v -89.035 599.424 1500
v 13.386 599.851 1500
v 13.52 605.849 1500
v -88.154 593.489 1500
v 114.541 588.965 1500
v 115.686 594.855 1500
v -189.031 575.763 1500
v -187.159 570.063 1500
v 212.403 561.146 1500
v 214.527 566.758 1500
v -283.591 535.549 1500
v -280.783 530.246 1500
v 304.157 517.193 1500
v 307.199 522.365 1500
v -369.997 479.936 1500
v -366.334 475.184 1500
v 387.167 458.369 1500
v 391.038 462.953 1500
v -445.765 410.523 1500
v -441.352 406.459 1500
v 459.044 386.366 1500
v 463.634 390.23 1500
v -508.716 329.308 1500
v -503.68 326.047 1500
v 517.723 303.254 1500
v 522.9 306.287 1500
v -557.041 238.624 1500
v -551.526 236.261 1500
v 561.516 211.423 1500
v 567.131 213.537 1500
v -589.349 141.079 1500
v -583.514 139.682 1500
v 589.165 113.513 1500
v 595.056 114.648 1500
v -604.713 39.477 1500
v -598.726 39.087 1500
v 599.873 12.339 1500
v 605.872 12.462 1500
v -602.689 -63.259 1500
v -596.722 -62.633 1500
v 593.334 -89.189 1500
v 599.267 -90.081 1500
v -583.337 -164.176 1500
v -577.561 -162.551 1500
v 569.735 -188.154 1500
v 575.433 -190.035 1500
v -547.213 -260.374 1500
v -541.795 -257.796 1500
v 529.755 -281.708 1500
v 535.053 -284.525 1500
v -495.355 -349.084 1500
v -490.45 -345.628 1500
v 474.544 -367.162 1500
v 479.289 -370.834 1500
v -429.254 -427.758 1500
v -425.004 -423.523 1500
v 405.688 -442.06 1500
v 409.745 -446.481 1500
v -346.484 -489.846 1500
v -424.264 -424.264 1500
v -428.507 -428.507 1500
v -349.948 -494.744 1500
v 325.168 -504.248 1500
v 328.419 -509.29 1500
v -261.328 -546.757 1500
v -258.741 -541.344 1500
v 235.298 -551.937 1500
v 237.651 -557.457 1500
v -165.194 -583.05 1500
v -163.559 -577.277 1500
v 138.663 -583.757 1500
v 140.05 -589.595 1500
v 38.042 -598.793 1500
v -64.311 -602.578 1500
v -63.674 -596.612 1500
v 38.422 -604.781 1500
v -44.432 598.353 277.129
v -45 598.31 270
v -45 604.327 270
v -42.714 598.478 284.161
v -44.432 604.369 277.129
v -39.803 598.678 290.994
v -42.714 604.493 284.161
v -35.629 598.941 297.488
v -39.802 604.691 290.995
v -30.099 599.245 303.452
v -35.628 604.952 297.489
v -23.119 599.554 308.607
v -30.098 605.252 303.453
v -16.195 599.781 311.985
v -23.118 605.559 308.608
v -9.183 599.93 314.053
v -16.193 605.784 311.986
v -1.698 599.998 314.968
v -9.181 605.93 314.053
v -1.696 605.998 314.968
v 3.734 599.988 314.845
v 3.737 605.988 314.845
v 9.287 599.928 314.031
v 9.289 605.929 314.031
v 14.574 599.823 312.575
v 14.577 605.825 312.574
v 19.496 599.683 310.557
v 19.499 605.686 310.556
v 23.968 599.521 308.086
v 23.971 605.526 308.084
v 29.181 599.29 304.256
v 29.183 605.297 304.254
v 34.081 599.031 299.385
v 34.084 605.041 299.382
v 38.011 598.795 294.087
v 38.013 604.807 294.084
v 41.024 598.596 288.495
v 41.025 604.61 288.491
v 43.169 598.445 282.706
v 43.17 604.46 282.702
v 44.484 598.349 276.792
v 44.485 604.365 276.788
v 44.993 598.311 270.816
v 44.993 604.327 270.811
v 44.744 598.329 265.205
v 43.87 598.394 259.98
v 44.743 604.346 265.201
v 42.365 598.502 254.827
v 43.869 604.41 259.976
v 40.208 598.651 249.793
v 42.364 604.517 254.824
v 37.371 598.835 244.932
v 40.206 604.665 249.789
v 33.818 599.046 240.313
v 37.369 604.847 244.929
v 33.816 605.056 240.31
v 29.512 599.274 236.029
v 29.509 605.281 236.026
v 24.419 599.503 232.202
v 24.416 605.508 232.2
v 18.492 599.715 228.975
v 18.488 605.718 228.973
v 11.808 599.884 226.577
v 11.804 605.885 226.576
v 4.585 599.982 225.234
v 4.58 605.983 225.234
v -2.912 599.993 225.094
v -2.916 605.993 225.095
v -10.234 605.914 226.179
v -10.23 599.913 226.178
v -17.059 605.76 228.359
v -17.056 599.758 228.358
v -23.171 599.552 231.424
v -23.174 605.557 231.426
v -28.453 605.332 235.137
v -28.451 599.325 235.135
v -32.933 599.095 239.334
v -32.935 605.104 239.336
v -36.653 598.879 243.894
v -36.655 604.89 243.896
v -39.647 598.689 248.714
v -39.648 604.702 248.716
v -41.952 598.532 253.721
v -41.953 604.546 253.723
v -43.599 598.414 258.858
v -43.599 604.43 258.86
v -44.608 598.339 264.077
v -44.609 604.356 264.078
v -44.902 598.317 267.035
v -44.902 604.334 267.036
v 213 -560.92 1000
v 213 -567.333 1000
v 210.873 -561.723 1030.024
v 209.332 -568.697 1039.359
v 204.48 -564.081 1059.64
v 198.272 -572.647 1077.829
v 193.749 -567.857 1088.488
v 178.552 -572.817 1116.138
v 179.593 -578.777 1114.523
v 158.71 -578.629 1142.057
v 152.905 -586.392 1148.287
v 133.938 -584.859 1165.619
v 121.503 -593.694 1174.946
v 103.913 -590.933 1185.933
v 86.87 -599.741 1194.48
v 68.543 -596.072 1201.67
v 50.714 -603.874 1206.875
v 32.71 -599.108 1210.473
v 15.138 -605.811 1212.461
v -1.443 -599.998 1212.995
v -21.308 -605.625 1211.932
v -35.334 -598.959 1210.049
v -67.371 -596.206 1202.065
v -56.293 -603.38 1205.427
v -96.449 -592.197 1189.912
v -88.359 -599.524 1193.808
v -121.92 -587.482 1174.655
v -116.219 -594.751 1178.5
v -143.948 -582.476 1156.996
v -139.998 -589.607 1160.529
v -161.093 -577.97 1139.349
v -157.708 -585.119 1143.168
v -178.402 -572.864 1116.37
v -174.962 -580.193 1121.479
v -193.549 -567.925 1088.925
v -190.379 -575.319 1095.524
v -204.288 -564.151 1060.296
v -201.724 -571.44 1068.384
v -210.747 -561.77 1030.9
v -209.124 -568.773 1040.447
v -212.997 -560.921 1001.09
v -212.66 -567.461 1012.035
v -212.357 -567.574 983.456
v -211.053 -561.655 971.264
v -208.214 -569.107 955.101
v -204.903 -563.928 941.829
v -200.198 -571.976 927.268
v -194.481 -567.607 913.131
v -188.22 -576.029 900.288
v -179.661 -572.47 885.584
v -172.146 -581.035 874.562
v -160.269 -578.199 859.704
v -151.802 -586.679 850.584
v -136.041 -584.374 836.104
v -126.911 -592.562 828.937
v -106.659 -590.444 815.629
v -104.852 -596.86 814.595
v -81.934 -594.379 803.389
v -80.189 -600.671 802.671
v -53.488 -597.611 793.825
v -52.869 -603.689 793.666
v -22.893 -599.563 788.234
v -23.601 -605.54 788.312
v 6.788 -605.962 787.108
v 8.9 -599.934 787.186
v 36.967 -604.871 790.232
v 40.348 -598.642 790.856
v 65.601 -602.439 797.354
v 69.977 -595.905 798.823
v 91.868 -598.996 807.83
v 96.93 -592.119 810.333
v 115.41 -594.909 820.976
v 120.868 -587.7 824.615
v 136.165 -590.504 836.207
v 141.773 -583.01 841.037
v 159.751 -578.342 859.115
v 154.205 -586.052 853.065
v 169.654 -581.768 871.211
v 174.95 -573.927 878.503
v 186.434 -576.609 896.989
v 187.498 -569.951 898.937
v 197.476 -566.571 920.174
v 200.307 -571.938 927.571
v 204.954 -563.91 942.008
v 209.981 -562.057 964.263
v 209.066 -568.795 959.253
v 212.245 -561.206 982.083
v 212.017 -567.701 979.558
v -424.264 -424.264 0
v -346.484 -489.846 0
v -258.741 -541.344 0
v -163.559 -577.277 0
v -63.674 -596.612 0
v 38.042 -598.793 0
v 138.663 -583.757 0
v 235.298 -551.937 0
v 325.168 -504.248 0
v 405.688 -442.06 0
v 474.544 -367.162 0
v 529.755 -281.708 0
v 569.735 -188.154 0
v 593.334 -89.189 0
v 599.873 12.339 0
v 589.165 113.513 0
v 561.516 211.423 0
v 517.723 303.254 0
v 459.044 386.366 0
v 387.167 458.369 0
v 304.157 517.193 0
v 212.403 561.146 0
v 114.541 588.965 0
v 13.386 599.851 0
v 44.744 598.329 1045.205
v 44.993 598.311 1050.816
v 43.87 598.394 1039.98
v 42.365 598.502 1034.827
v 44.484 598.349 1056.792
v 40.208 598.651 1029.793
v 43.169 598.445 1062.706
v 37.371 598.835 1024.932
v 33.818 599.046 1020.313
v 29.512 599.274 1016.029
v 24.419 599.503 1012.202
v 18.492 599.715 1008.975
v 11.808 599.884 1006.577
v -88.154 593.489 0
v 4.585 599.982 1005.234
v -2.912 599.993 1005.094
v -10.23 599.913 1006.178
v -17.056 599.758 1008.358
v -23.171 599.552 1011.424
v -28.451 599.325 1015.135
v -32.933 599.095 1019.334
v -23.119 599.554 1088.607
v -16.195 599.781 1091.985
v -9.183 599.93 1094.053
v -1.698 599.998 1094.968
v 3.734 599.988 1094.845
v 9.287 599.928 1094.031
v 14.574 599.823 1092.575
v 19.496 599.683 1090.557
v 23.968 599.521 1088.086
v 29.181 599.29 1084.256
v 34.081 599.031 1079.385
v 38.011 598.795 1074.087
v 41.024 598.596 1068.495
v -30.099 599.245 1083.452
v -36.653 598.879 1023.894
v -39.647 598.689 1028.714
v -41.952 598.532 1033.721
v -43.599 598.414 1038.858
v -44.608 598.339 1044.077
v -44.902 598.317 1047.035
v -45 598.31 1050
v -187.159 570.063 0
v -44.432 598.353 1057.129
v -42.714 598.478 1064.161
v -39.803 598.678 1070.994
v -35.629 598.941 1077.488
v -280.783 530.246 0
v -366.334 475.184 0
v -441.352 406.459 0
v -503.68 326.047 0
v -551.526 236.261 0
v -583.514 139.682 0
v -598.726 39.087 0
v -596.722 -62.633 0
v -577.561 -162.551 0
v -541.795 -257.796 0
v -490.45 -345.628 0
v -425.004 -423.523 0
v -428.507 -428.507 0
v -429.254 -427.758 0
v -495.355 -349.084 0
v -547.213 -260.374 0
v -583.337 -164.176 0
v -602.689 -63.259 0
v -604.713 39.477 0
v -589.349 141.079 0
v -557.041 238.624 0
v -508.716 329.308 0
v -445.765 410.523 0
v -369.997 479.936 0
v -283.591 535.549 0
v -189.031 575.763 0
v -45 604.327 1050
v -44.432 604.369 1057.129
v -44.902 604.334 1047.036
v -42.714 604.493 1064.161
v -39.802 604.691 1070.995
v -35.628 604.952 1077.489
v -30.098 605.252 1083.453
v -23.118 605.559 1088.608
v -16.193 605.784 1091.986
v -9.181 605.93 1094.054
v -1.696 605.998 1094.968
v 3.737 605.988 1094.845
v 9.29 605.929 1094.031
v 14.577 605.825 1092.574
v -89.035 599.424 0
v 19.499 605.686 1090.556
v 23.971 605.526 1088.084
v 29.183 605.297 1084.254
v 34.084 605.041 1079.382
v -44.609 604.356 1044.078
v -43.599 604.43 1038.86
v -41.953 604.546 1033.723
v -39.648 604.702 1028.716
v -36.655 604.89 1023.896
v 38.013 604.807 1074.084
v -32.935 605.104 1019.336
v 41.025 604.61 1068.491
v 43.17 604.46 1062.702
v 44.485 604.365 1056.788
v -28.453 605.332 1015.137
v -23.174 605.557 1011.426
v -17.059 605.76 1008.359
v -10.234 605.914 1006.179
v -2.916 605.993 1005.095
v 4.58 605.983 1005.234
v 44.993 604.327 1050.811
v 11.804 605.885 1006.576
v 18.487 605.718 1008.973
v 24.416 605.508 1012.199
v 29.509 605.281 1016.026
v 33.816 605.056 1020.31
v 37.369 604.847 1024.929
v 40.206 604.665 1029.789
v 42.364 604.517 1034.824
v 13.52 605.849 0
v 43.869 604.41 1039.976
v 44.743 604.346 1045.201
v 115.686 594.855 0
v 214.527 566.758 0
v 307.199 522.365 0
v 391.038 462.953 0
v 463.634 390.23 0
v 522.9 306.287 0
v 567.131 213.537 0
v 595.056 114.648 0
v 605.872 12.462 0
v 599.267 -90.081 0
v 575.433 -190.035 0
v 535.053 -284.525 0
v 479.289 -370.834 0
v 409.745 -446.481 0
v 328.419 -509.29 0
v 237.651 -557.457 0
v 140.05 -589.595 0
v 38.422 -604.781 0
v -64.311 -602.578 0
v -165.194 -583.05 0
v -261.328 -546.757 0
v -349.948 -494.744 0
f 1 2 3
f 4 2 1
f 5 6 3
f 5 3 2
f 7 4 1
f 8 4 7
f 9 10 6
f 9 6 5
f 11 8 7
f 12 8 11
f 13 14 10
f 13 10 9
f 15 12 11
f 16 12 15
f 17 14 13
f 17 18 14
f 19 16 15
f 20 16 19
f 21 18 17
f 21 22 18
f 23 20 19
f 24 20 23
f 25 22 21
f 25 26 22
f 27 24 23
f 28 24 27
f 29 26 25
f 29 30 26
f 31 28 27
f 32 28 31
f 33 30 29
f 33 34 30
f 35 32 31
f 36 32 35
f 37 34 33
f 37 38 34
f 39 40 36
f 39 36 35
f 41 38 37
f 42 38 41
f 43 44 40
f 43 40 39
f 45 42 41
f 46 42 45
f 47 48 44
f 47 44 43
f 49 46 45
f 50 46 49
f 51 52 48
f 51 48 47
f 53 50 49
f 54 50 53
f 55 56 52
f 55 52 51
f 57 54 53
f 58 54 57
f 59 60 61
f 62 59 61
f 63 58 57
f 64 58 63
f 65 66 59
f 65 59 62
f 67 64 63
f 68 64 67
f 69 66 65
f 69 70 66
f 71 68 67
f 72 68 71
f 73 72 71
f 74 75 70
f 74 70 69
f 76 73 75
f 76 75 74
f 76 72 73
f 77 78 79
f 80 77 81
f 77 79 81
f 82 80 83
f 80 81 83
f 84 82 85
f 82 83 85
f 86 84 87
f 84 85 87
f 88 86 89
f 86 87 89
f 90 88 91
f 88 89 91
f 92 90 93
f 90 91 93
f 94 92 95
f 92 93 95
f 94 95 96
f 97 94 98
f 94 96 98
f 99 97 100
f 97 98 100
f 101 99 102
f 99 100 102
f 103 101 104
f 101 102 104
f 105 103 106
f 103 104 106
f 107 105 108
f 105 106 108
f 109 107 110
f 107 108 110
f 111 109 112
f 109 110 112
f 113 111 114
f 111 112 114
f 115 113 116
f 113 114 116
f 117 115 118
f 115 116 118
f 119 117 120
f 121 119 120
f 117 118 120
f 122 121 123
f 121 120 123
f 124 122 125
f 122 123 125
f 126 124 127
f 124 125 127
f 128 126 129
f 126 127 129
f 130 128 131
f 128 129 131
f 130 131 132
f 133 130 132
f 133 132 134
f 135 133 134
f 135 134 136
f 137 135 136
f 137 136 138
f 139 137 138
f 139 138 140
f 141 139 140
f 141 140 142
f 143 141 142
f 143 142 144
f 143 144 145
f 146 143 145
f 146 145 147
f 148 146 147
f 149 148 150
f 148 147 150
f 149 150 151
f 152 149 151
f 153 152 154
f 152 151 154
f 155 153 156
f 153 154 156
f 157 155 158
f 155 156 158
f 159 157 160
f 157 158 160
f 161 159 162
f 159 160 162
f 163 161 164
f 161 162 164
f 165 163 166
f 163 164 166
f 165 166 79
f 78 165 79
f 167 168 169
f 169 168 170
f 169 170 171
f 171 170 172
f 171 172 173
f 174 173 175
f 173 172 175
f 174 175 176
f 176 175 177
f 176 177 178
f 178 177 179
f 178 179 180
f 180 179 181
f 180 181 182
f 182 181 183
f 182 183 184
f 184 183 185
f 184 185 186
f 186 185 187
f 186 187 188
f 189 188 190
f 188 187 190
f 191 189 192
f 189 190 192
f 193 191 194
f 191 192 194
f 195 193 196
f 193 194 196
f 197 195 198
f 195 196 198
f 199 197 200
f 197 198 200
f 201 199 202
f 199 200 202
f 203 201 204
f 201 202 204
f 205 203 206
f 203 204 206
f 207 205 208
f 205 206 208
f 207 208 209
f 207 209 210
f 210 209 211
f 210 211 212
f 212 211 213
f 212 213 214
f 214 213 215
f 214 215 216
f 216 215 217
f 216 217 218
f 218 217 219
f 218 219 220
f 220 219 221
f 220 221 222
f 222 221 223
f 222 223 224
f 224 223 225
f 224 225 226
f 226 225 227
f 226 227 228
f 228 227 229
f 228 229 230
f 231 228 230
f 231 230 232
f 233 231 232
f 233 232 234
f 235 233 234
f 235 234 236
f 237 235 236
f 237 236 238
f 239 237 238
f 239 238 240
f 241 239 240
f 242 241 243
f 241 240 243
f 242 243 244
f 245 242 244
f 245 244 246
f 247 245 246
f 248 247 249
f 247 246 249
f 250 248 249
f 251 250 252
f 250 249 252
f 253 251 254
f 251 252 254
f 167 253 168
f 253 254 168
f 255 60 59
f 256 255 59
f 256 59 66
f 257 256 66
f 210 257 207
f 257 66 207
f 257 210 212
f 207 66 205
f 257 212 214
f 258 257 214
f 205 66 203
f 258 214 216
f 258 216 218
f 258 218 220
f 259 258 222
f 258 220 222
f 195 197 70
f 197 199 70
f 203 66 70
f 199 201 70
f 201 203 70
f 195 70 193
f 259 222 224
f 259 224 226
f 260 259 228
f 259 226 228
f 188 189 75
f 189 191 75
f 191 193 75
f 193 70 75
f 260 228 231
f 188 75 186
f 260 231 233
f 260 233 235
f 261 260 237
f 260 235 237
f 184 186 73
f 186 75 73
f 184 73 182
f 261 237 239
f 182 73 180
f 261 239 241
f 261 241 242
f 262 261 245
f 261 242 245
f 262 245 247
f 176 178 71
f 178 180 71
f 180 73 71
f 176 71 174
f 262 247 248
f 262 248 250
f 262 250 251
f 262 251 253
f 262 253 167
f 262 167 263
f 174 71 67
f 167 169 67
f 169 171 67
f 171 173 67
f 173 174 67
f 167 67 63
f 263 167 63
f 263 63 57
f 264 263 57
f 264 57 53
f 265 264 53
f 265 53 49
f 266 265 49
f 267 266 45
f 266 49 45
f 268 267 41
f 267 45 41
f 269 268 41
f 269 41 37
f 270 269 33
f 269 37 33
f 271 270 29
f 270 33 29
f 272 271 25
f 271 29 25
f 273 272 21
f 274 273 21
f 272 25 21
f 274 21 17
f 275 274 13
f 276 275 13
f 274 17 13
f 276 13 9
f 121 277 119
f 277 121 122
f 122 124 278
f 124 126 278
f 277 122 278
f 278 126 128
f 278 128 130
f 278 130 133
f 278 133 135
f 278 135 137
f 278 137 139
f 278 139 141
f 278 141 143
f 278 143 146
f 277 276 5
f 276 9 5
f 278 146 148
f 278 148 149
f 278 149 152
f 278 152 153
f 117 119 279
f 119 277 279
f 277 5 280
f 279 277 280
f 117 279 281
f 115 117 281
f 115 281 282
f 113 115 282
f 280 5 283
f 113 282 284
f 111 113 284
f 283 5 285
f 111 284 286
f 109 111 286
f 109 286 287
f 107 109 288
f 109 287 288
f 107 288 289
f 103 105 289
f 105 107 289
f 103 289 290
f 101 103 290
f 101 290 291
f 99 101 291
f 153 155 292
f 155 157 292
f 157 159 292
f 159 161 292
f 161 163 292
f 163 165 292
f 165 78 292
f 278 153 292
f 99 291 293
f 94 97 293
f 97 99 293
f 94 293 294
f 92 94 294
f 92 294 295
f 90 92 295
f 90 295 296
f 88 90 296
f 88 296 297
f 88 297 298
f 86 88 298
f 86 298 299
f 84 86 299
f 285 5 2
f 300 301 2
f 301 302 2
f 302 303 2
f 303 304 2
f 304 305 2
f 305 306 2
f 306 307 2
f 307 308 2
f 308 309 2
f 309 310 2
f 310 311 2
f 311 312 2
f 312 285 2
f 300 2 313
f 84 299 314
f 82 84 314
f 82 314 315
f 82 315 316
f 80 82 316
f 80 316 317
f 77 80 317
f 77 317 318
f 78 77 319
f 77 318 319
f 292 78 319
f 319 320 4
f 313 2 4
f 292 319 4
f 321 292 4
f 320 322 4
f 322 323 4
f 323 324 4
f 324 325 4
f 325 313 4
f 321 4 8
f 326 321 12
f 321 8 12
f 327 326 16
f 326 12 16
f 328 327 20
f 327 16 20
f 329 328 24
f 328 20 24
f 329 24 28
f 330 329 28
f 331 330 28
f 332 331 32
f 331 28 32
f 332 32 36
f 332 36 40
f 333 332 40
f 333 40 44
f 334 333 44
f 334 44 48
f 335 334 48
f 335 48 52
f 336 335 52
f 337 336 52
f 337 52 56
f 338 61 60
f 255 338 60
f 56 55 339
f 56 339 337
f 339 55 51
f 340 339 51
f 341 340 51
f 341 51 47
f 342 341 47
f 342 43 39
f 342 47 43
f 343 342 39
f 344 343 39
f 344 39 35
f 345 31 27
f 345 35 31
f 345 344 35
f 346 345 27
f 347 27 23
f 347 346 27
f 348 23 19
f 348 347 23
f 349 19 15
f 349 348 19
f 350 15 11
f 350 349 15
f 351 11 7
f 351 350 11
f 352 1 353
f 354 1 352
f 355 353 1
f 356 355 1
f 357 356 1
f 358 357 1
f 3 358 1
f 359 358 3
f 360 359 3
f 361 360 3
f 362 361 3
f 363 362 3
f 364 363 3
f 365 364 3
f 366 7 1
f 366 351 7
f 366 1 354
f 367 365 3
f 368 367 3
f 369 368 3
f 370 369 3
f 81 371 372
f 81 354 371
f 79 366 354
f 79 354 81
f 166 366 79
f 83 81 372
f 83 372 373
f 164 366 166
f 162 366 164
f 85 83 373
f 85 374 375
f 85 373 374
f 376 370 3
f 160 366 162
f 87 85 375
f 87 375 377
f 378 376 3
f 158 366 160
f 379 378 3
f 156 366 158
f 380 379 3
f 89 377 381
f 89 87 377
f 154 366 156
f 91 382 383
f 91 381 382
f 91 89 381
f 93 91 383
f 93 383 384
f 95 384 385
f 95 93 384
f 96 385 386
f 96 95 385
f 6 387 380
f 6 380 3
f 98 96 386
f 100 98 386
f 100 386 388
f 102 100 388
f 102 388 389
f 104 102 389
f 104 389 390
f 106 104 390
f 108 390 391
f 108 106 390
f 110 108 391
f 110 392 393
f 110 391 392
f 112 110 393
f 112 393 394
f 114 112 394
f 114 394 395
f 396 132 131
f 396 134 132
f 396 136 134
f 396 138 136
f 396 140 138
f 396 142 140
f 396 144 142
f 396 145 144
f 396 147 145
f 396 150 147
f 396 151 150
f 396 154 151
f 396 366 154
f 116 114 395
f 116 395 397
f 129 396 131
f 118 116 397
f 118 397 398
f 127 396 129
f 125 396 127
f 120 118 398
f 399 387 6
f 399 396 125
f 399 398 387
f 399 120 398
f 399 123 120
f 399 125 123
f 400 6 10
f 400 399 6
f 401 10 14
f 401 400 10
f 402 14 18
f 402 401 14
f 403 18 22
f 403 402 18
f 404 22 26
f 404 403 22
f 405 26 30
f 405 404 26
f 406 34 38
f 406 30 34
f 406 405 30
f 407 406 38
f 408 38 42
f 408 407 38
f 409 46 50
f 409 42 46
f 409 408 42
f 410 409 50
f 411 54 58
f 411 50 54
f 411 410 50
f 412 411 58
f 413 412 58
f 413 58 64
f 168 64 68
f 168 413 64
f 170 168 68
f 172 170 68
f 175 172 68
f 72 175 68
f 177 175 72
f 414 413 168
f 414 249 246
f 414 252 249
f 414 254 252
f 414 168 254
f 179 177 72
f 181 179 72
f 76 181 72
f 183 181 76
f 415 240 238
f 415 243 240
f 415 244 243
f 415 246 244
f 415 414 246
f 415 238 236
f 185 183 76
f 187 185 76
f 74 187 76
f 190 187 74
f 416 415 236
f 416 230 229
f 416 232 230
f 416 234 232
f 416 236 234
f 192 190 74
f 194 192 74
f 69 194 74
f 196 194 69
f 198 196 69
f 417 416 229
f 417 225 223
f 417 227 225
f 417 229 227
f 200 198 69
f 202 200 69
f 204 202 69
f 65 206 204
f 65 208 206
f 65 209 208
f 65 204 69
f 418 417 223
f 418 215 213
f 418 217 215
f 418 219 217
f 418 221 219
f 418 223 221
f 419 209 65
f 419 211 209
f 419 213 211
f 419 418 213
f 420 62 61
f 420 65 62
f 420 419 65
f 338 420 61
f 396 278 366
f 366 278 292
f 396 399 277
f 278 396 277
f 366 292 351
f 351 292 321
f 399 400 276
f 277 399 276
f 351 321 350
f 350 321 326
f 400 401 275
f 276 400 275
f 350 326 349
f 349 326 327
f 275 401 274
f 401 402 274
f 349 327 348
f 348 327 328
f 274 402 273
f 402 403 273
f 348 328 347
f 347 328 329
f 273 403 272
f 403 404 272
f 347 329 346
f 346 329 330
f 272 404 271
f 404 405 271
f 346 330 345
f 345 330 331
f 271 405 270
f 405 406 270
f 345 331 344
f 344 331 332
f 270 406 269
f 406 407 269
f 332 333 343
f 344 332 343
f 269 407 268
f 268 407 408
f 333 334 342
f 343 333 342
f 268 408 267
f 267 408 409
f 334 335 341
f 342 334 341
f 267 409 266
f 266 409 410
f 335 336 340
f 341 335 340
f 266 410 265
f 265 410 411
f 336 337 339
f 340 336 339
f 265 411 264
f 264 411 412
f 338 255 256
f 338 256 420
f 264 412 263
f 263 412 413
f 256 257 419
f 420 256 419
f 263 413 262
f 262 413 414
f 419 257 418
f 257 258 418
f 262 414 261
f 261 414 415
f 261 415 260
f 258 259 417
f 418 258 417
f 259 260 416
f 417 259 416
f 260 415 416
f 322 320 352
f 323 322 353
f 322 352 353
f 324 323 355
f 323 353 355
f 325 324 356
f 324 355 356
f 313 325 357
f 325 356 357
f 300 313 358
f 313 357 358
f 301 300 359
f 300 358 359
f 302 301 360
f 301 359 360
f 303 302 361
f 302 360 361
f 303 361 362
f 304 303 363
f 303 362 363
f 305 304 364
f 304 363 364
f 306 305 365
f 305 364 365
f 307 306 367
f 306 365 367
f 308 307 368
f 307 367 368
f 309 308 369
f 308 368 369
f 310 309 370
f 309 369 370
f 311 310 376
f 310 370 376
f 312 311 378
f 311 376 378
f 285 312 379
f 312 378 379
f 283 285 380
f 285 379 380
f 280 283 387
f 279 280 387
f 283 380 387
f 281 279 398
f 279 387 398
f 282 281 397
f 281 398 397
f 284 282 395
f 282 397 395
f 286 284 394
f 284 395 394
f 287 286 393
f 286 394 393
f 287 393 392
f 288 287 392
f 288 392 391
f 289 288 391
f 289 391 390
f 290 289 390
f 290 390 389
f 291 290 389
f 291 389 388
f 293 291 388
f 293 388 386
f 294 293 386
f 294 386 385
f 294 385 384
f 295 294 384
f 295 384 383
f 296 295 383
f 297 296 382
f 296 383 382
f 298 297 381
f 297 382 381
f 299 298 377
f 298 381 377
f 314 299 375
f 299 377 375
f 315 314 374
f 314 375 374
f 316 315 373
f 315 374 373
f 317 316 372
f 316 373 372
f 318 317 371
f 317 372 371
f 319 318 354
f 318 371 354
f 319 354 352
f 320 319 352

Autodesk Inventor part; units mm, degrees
sketch "floor angle sketch" plane through (0, 0, 0) normal (0, 0, 1) x (1, 0, 0)
  line L0 (0, 0) -> (0, -240.1382) construction
  line L1 (0, 0) -> (0, -1006)
  line L2 (-428.5067, -428.5067) -> (428.5067, 428.5067) construction
  circle A0 centre (0, 0) radius 606 construction
  line L3 (0, 0) -> (0, 806)
  line L4 (45, 806) -> (-45, 806)
  line L5 (-213, -1006) -> (213, -1006)
  line L6 (0, 0) -> (-309.8702, -851.3615)
  line L7 (0, 0) -> (0, 706)
  line L8 (45, 706) -> (-45, 706)
  line L9 (-370.9503, -829.1302) -> (-248.7902, -873.5928)
  dimension "d51" = 1212
  dimension "d52" = 45
  dimension "d54" = 0
  dimension "d55" = 180
  dimension "d56" = 426
  dimension "d58" = 90
  dimension "d59" = 90
  dimension "d60" = 180
  dimension "d61" = 706
  dimension "d62" = 130
  dimension "d63" = 20
  dimension "d64" = 806
  dimension "d65" = 906
  dimension "d66" = 1006
ref_plane "SHELL Plane" through (-428.5067, -428.5067, 0) normal (0.7071, -0.7071, 0) x (0.7071, 0.7071, 0)
ref_plane "ACCESS Plane" through (-213, -1006, 0) normal (0, -1, 0) x (1, 0, 0)
ref_plane "OUTER Plane" through (45, 806, 0) normal (0, 1, 0) x (-1, 0, 0)
ref_plane "INNER Plane" through (45, 706, 0) normal (0, 1, 0) x (-1, 0, 0)
ref_plane "CHARGE Plane" through (-370.9503, -829.1302, 0) normal (-0.342, -0.9397, 0) x (0.9397, -0.342, 0)
sketch "Sketch13" plane through (-428.5067, -428.5067, 0) normal (0.7071, -0.7071, 0) x (0.7071, 0.7071, 0)
  line L0 (606, 0) -> (606, 892.6829)
  line L1 (0, 0) -> (6, 0)
  line L2 (6, 0) -> (6, 1500)
  line L3 (6, 1500) -> (0, 1500)
  line L4 (0, 1500) -> (0, 0)
  dimension "d75" = 1500
  dimension "d76" = 6
  dimension "d77" = 1212
revolve "Revolution2" add sketch "Sketch13" angle 359.9 about axis through (0, 0, 0) along (0, 0, 1)
sketch "Sketch14" plane through (-213, -1006, 0) normal (0, -1, 0) x (1, 0, 0)
  circle A0 centre (213, 1000) radius 213
  point P0 (213, 0)
  dimension "d79" = 1000
  dimension "d80" = 426
extrude "ACCESS" cut sketch "Sketch14" against normal up to next
sketch "Sketch15" plane through (45, 706, 0) normal (0, 1, 0) x (-1, 0, 0)
  circle A0 centre (45, 270) radius 45
  point P0 (45, 0)
  dimension "d84" = 90
  dimension "d85" = 270
extrude "INNER" cut sketch "Sketch15" against normal up to next
sketch "Sketch16" plane through (45, 806, 0) normal (0, 1, 0) x (-1, 0, 0)
  circle A0 centre (45, 1050) radius 45
  point P0 (45, 0)
  dimension "d88" = 1050
  dimension "d89" = 90
extrude "Extrusion9" cut sketch "Sketch16" against normal up to next
equation "\"BendRadius\" = Thickness"
equation "\"BendReliefWidth\" = Thickness"
equation "\"BendReliefDepth\" = 0.5 * Thickness"
equation "\"CornerReliefSize\" = 4 * Thickness"
equation "\"MinimumRemnant\" = 2 * Thickness"
equation "\"TransitionRadius\" = BendRadius"
equation "\"JacobiRadiusSize\" = BendRadius"
equation "\"GapSize\" = Thickness"
equation "\"Thickness\" = 6"
properties part number "TZS 1202 SHELL" material "Steel"
